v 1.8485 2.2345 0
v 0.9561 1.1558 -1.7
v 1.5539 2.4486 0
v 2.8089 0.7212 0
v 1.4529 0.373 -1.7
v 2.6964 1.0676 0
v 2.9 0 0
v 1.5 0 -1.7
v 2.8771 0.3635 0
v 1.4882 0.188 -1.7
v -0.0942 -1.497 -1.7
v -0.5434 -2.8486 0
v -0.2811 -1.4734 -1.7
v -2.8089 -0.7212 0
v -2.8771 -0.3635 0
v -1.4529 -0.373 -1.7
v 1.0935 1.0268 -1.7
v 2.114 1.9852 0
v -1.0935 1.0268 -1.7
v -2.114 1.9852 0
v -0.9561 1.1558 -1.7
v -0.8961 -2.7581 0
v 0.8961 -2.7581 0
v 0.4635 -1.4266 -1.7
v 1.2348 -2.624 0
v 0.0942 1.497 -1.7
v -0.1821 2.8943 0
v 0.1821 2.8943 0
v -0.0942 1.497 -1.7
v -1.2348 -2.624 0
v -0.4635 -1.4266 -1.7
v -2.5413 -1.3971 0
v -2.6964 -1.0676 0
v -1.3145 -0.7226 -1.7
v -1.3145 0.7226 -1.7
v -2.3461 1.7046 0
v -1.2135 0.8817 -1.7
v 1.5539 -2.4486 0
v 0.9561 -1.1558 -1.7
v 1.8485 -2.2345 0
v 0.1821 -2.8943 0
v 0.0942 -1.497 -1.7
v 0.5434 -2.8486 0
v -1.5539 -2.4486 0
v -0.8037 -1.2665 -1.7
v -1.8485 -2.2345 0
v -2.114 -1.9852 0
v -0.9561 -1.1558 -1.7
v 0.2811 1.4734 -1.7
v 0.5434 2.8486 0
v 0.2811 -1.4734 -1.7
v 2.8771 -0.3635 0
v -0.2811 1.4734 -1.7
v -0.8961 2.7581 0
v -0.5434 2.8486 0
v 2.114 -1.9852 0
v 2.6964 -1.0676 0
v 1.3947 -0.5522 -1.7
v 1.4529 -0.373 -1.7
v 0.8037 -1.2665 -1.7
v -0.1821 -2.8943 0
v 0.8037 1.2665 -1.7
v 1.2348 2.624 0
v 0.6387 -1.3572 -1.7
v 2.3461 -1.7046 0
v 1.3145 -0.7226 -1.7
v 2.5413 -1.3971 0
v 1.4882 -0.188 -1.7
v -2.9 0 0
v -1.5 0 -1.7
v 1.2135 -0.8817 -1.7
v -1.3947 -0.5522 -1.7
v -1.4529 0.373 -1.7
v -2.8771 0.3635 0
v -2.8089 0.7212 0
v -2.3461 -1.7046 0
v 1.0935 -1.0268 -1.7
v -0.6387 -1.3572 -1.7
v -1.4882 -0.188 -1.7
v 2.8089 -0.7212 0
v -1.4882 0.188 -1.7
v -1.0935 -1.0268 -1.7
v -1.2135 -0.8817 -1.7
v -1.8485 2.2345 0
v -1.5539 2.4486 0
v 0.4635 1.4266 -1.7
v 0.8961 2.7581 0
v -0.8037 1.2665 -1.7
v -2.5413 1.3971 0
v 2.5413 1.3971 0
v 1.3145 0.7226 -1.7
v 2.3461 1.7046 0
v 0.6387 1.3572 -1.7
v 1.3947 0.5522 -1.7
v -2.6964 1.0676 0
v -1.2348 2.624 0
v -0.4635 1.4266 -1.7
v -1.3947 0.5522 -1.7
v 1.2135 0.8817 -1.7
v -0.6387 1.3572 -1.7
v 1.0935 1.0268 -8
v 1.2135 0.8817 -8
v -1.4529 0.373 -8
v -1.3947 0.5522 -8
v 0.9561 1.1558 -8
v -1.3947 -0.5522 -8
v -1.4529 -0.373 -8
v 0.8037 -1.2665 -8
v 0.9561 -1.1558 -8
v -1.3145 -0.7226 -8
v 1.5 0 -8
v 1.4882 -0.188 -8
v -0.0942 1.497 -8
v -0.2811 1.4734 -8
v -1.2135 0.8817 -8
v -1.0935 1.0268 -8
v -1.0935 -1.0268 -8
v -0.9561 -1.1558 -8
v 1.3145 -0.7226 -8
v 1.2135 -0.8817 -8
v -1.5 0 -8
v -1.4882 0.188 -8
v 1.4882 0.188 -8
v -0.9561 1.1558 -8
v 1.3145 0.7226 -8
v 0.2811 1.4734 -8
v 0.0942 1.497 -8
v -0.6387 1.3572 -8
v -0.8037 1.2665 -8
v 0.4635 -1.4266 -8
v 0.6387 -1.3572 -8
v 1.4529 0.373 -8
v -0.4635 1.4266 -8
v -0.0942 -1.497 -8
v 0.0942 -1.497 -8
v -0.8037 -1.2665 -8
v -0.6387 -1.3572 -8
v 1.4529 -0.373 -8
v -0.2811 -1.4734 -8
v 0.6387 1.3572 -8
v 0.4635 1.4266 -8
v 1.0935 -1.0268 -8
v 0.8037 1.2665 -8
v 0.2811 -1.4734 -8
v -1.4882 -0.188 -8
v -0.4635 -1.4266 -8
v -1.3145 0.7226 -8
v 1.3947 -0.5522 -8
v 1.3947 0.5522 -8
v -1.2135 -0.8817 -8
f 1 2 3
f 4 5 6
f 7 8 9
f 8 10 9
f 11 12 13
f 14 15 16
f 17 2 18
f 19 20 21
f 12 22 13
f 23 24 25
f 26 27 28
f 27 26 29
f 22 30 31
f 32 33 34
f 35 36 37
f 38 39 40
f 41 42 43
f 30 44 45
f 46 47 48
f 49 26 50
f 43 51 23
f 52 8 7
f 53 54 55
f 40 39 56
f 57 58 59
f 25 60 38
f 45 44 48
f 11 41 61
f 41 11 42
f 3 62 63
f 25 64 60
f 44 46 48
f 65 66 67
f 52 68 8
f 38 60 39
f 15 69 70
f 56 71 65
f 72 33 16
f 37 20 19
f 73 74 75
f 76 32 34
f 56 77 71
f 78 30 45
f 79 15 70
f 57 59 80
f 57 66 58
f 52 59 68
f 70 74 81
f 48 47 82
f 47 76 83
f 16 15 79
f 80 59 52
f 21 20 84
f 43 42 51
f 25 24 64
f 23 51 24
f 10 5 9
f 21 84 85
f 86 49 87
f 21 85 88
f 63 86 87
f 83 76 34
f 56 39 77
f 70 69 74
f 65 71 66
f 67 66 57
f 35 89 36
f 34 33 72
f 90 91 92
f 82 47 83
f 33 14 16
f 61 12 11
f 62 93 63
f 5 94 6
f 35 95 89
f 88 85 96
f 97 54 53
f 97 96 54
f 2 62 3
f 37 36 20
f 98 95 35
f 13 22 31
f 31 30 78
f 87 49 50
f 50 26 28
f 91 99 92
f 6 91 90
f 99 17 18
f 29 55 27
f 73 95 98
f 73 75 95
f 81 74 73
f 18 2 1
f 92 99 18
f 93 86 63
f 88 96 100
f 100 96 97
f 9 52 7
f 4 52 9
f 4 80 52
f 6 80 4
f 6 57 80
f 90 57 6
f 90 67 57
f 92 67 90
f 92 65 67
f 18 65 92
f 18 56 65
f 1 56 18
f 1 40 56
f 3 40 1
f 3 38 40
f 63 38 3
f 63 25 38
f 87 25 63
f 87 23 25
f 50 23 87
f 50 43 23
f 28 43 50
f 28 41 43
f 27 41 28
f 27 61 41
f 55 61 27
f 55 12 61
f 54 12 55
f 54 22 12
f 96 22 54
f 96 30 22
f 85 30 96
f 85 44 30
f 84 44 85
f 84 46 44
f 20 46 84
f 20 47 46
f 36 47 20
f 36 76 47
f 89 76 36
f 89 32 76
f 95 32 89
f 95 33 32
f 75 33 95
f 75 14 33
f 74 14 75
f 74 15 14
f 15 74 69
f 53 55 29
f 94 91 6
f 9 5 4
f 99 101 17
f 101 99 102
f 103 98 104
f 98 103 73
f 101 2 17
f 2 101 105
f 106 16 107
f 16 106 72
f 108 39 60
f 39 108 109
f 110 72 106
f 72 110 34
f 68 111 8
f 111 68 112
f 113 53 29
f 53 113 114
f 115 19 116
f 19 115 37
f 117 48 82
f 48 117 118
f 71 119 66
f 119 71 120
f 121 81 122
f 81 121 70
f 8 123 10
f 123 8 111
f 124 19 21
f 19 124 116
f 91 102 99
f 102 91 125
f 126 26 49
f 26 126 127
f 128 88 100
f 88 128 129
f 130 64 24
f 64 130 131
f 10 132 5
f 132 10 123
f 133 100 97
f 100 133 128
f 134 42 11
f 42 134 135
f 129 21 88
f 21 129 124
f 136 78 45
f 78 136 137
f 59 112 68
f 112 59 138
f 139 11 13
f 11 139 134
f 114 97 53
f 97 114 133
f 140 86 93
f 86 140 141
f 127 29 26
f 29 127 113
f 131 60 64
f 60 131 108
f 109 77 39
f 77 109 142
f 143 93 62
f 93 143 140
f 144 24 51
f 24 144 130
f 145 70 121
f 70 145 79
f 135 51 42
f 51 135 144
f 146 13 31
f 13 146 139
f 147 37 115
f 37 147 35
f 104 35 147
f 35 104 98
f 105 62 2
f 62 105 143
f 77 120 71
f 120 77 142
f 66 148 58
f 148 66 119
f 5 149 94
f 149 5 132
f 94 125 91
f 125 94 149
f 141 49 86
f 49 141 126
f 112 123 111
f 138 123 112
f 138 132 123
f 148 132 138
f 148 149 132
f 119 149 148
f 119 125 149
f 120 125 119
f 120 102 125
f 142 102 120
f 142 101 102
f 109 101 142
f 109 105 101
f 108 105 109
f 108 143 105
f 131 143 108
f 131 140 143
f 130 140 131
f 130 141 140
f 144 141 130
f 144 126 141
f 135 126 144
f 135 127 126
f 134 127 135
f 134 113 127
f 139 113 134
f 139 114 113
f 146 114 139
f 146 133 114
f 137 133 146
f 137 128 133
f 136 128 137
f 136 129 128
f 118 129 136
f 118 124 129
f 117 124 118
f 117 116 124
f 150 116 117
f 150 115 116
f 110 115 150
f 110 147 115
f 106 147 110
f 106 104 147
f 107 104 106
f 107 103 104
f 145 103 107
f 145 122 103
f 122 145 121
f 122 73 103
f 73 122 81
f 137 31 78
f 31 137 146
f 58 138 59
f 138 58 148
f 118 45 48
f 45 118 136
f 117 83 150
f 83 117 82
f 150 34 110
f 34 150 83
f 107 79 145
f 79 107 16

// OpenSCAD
// Generated by SolidPython 1.1.3 on 2023-03-13 21:06:12
$fn = 50;


difference() {
	union() {
		translate(v = [0, 0, -1.7000000000]) {
			rotate(a = [0, 0, 0]) {
				cylinder(h = 1.7000000000, r1 = 1.5000000000, r2 = 2.9000000000);
			}
		}
		translate(v = [0, 0, -8]) {
			rotate(a = [0, 0, 0]) {
				cylinder(h = 8, r = 1.5000000000);
			}
		}
	}
	union();
}
/***********************************************
*********      SolidPython code:      **********
************************************************
 
from solid import *
import os
import subprocess

import oomB

import opsc_library_gen

mode = "laser"
#mode = "3d_print"

defined_objects = {}

radius_dict = {}
countersunk_dict = {}


def set_mode(m):
    global mode
    mode = m
    radius_dict['M6'] = 6.5/2
    radius_dict['M3'] = 3.3/2
    if mode == "laser":
        radius_dict['M6'] = 6/2
        radius_dict['M3'] = 3/2

    countersunk_dict['M3'] = {}
    countersunk_dict['M3']['little_rad'] = radius_dict['M3']
    countersunk_dict['M3']['big_rad'] = (5.5+0.6)/2
    if mode == "laser":
        countersunk_dict['M3']['big_rad'] = (4.75+0.6)/2
        countersunk_dict['M3']['little_rad'] = (4.75+0.6)/2

    countersunk_dict['M3']['height'] = 1.7


def opsc_make_object(filename, objects, save_type="none",resolution=50, layers = 1, tilediff = 200, mode="laser", overwrite=True):
    if overwrite or not os.path.exists(filename):
        set_mode(mode)
        save_type = save_type.lower()
        os.makedirs(os.path.dirname(filename), exist_ok=True)
        final_object = opsc_get_object(objects, mode = mode)
        # Save the final object to the specified filename    
        scad_render_to_file(final_object, filename, file_header='$fn = %s;' % resolution, include_orig_code=True)
        if save_type == "all":
            saveToAll(filename)
        elif save_type == "dxf":
            saveToDxf(filename)
        if mode == "laser":
            filename_laser = filename.replace(".scad","-flat.scad")
            scad_render_to_file(getLaser(final_object, layers=layers, tilediff=tilediff), filename_laser, file_header='$fn = %s;' % resolution, include_orig_code=True)
            if save_type == "all":
                saveToAll(filename_laser)
            elif save_type == "dxf":
                saveToDxf(filename_laser)


def opsc_get_object(objects, mode = "laser"):
    # Create the solidpython objects only include the positive objects and if they don't have inclusion or their inclusion is either all or mode
    # Initialize an empty list to store the results
    positive_objects = []

    # Iterate over the "objects" list
    for obj in objects:
        # Check if the current object has a "type" key with a value of "positive"
        if obj['type'] == 'positive':
            # Check if the current object has an "inclusion" key and its value matches "mode",
            # or if the current object does not have an "inclusion" key at all
            if not 'inclusion' in obj or obj['inclusion'] == "all" or obj['inclusion'] == mode:
                # Call the "get_opsc_item" function with the current object as an argument
                opsc_item = get_opsc_item(obj)
                # Add the result to the "positive_objects" list
                positive_objects.append(opsc_item)
# Initialize an empty list to store the results
    negative_objects = []

    # Iterate over the "objects" list
    for obj in objects:
        # Check if the current object has a "type" key with a value of "negative"
        if obj['type'] == 'negative':
            # Check if the current object has an "inclusion" key and its value matches "mode",
            # or if the current object does not have an "inclusion" key at all
            if not 'inclusion' in obj or obj['inclusion'] == "all" or obj['inclusion'] == mode:
                # Call the "get_opsc_item" function with the current object as an argument
                opsc_item = get_opsc_item(obj)
                # Add the result to the "negative_objects" list
                negative_objects.append(opsc_item)
    
    #positive_objects = [get_opsc_item(obj) for obj in objects if obj['type'] == 'positive']
    #negative_objects = [get_opsc_item(obj) for obj in objects if obj['type'] == 'negative']
    # Union the positive objects
    positive_object = union()(*positive_objects)
    # Union the negative objects
    negative_object = union()(*negative_objects)
    # Create the final object by subtracting the negative objects from the positive objects
    return difference()(positive_object, negative_object)

def get_opsc_item(params):
    # A dictionary to map radius string values to numerical values
    #radius_dict = {'small': 5, 'medium': 10, 'large': 15}
    # An array of function names for basic shapes
    basic_shapes = ['cube', 'sphere', 'cylinder']
    
    # An array of function names for other shapes
    other_shapes = ['hole', 'slot', 'rounded_rectangle', 'countersunk', 'polyg']
    


    # Convert radius to r if present, and remove radius from the params dictionary
    if 'radius' in params:
        if isinstance(params['radius'], str):
            # Use the radius_dict to map the radius string value to a numerical value
            params['r'] = radius_dict[params['radius']]
        else:
            params['r'] = params['radius']
        del params['radius']
    

    # Check if the object type is a basic shape
    if params['shape'] in basic_shapes:
        # Remove shape and unexpected dictionary values
        allowed_keys = {'size', 'r', 'r1', 'r2', 'd', 'h', 'rw', 'rh', 'dw', 'dh'}
        shape_params = {k: v for k, v in params.items() if k in allowed_keys}

        #params['m'] = "#"
        ###split for adding modifier
        try:
            m = params['m']
            func = globals()[params['shape']]
            return_value = get_opsc_transform(params,func(**shape_params))
            return_value = (return_value).set_modifier(m)
            return return_value
        except KeyError as e:
            return get_opsc_transform(params,globals()[params['shape']](**shape_params))
        
    elif params['shape'] == 'polygon':
        # Remove shape and unexpected dictionary values
        h  = params['height']
        allowed_keys = {'points'}
        shape_params = {k: v for k, v in params.items() if k in allowed_keys}

        # Call the corresponding function for the shape parameter, using ** notation to pass the shape_params dictionary as keyword arguments
        params["rot"] = [0,0,0]        
        try:
            m = params['m']
            func = globals()[params['shape']]
            return_value = get_opsc_transform(params,linear_extrude(h)(globals()[params['shape']](**shape_params)))
            return_value = (return_value).set_modifier(m)
            return return_value
        except KeyError as e:
            return_value = get_opsc_transform(params,linear_extrude(h)(globals()[params['shape']](**shape_params)))
            return_value = (return_value)
            return return_value


    # If the object type is not a basic shape, check if it's a defined object or one of the other shapes
    elif params['shape'] in other_shapes:
        # Call the corresponding function for the shape parameter, passing the params dictionary as an argument
        p2 = copy.deepcopy(params)
        p2["pos"] = [0,0,0]
        return get_opsc_transform(params,globals()[params['shape']](p2))
    
    # If the object is not a basic shape or a defined object, try to import it from a .scad file
    else:
        obj = defined_objects[params['shape']]
        return get_opsc_transform(params,obj)

def get_opsc_transform(params, solid_obj):
    # Rotate the object based on the 'rot' field in the params dictionary, or the 'rotX', 'rotY', and 'rotZ' fields if 'rot' is not present
    rot = params.get('rot', [])
    if rot:
        rotX, rotY, rotZ = rot
    else:
        rotX = params.get('rotX', 0)
        rotY = params.get('rotY', 0)
        rotZ = params.get('rotZ', 0)
    solid_obj = rotate([rotX, rotY, rotZ])(solid_obj)

    # Translate the object based on the 'pos' field in the params dictionary, or the 'x', 'y', and 'z' fields if 'pos' is not present
    pos = params.get('pos', [])
    if pos:
        x, y, z = pos
    else:
        x = params.get('x', 0)
        y = params.get('y', 0)
        z = params.get('z', 0)
    solid_obj = translate([x, y, z])(solid_obj)
    return solid_obj


import random

def opsc_easy_array(type, shape, repeats, pos_start, shift_arr, **kwargs):
    for i in range(0,3):
        repeats.append(1)
        pos_start.append(0)
        shift_arr.append(0)
    return_objects = []

    for x in range(0,repeats[0]):
        for y in range(0,repeats[1]):
            for z in range(0,repeats[2]):
                return_objects.append(opsc_easy(type, shape, pos=[pos_start[0]+x*shift_arr[0],pos_start[1]+y*shift_arr[1],pos_start[2]+z*shift_arr[2]], **kwargs))
    return return_objects                



def opsc_easy(type, shape, **kwargs):
    obj = {
        'type': type,
        'shape': shape
    }
    for param in ['size', 'r', 'r1', 'r2', 'd', 'h', 'rw', 'rh', 'dw', 'dh', 'pos', 'x', 'y', 'z', 'rot', 'rotX', 'rotY', 'rotZ', "w", "inclusion", 'sides', 'height', "m"]:
        if param in kwargs:
            obj[param] = kwargs[param]
    return obj

def hole(params):
    p2 = copy.deepcopy(params)  
    # Check if the radius is a string and replace it with the corresponding value from the dictionary
    if isinstance(p2['r'], str):
        p2['r'] = radius_dict[p2['r']]
    
    # Set the height to 100 if not specified
    if 'h' not in p2:
        p2['h'] = 100
        p2["pos"] = [0,0,-50]
    p2["center"] = True
    # Create the cylinder object
    p2["shape"] = "cylinder"
    p2["type"] = "positive"

    return get_opsc_item(p2)

import copy

def countersunk(params):
    p2 = copy.deepcopy(params)
    counter_rad = p2['r']
    p2['r'] = radius_dict[p2['r']]
    hp = copy.deepcopy(p2)
    hp["type"] = "positive"
    hp["shape"] = "hole"
    del hp["rot"]
    hol = get_opsc_item(hp)
    
    cp = copy.deepcopy(p2)
    cp["h"] = countersunk_dict[counter_rad]["height"]
    cp["r2"] = countersunk_dict[counter_rad]["little_rad"]
    cp["r1"] = countersunk_dict[counter_rad]["big_rad"]
    del cp["r"]
    del cp["rot"]
    cp["type"] = "positive"
    cp["shape"] = "cylinder"
    cp["pos"] = [0,0,0]

    top = get_opsc_item(cp)
    return union()(hol,top)



def slot(params):  
    p2 = copy.deepcopy(params) 
    if isinstance(p2['r'], str):
        p2['r'] = radius_dict[p2['r']]
    p2["type"] = "positive"
    p2["shape"] = "hole"
    del p2["rot"]
    p2["pos"] = [0,0,0]
    left = copy.deepcopy(p2)
    right = copy.deepcopy(p2)
    left["pos"][0] = p2["w"] / 2 - p2["r"] 
    
    right["pos"][0] = -p2["w"] / 2 + p2["r"] 
    pass
    leftObj = get_opsc_item(left)
    rightObj = get_opsc_item(right)
    return hull()(leftObj, rightObj)

def rounded_rectangle(params):   
    p2 = copy.deepcopy(params) 
    p2["h"] = p2["size"][2]
    p2["pos"] = p2.get("pos", [0, 0, 0]) 
    p2["type"] = "positive"
    p2["shape"] = "hole"
    p2["pos"] = [0,0,0]
    
    if 'rot' in p2:
        del p2["rot"]   
    if 'r' not in p2:
        p2["r"] = 5 
    tl = copy.deepcopy(p2)
    tr = copy.deepcopy(p2)
    bl = copy.deepcopy(p2)
    br = copy.deepcopy(p2)
    tl["pos"][0] = -(p2["size"][0] - p2["r"]*2)/2
    tl["pos"][1] = (p2["size"][1] - p2["r"]*2)/2
    tr["pos"][0] = (p2["size"][0] - p2["r"]*2)/2
    tr["pos"][1] = (p2["size"][1] - p2["r"]*2)/2
    bl["pos"][0] = -(p2["size"][0] - p2["r"]*2)/2
    bl["pos"][1] = -(p2["size"][1] - p2["r"]*2)/2
    br["pos"][0] = (p2["size"][0] - p2["r"]*2)/2
    br["pos"][1] = -(p2["size"][1] - p2["r"]*2)/2
    del tl["size"]
    del tr["size"]
    del bl["size"]
    del br["size"]
    tlo = get_opsc_item(tl)
    tro = get_opsc_item(tr)
    blo = get_opsc_item(bl)
    bro = get_opsc_item(br)    
    return hull()(tlo, tro, blo, bro)



def polyg(params):
    p2 = copy.deepcopy(params) 
    p2["type"] = "positive"
    p2["shape"] = "polygon"
    p2["pos"] = [0,0,0]
    sides = p2["sides"]
    radius = p2["r"]    
    angles = [i * 360 / sides for i in range(sides)]
    points = regular_polygon(sides, radius)
    
    p2["points"] = points
    return get_opsc_item(p2)

import math

def regular_polygon(num_sides, radius):
    # Calculate the angle between each side
    angle = 2 * math.pi / num_sides

    # Calculate the points of the polygon
    points = []
    for i in range(num_sides):
        x = radius * math.cos(i * angle)
        y = radius * math.sin(i * angle)
        points.append((x, y))
    return points

def import_scad_object(filename):
    # Import the .scad file and convert it to a solidpython object
    #filename = "parts"
    obj = import_scad(filename)
    return obj.main()



import os
import solid as solidpython

# A dictionary to store the defined objects


def load_scad_objects():
    opsc_library_gen.gen_library(defined_objects)

import random

def test(num_objects):
    objects = []
    for i in range(num_objects):
        # Choose a random shape
        #shape = random.choice(['cube', 'sphere', 'cylinder', 'hole', 'slot', "rounded_rectangle"])
        shape = random.choice(["rounded_rectangle"])

        # Choose a random type
        type = random.choice(['positive', 'negative'])
        
        # Create an empty object dictionary
        obj = {'shape': shape, 'type': type}
        
        # Set shape-specific parameters
        if obj['shape'] in ['cube']:
            obj['size'] =  [random.uniform(5, 15), random.uniform(5, 15), random.uniform(5, 15)]
        if obj['shape'] in ['rounded_rectangle']:
            obj['size'] =  [random.uniform(5, 15), random.uniform(5, 15), random.uniform(5, 15)]
            obj['r'] = random.uniform(0.5, 5)
        elif obj['shape'] == 'sphere':
            obj['r'] = random.uniform(5, 15)
        elif obj['shape'] in ['cylinder', 'hole']:
            obj['r'] = random.uniform(0.5, 5)
            obj['h'] = random.uniform(5, 15)
        elif obj['shape'] == 'slot':
            obj['r'] = random.uniform(0.5, 5)
            obj['h'] = random.uniform(5, 15)
            obj['w'] = random.uniform(5, 15)
        
        # Set a random position and rotation
        obj['pos'] = [random.uniform(-20, 20), random.uniform(-20, 20), random.uniform(-20, 20)]
        obj['rot'] = [random.uniform(-180, 180), random.uniform(-180, 180), random.uniform(-180, 180)]
        
        # Add the object to the list
        objects.append(obj)
    return objects

####### old file saving
def saveToAll(fileIn):
    saveToStl(fileIn)
    saveToDxf(fileIn)
    saveToPng(fileIn)
    saveToSvg(fileIn)

def saveToDxf(fileIn, fileOut="", copy_to_laser=True):
    if fileOut == "":
        fileOut = fileIn.replace(".scad",".dxf")
    saveToFile(fileIn, fileOut)


    
def saveToPng(fileIn, fileOut="",extra="--render"):
    if fileOut == "":
        fileOut = fileIn.replace(".scad",".png")
    saveToFile(fileIn, fileOut)

def saveToStl(fileIn, fileOut=""):
    if fileOut == "":
        fileOut = fileIn.replace(".scad",".stl")
    saveToFile(fileIn, fileOut)
    
def saveToSvg(fileIn, fileOut=""):
    if fileOut == "":
        fileOut = fileIn.replace(".scad",".svg")
    saveToFile(fileIn, fileOut)

def saveToFile(fileIn, fileOut,extra=""):
    #extra = extra + " --colorscheme Tomorrow"

    launchStr = 'openscad -o "' + fileOut + '"' + extra + ' "' + fileIn + '"'
    if ".png" in fileOut:
        launchStr = launchStr + " --render"
    print("            saveToFile launch string: " + launchStr)
    subprocess.run(launchStr)
    x=0

def getLaser(final_object,start=1.5,layers=1,thickness=3,tilediff=200):
        rv= []

        for x in range(layers):
            rv.append(translate([0,x*tilediff,0])(
                    projection()(
                        intersection()(translate([-500,-500,start+x*thickness])(cube(size=[1000,1000,0.1])),
                            final_object
                        )
                    )
            )
            )
            
        return union()(rv)

set_mode("laser")
load_scad_objects() 
 
************************************************/
